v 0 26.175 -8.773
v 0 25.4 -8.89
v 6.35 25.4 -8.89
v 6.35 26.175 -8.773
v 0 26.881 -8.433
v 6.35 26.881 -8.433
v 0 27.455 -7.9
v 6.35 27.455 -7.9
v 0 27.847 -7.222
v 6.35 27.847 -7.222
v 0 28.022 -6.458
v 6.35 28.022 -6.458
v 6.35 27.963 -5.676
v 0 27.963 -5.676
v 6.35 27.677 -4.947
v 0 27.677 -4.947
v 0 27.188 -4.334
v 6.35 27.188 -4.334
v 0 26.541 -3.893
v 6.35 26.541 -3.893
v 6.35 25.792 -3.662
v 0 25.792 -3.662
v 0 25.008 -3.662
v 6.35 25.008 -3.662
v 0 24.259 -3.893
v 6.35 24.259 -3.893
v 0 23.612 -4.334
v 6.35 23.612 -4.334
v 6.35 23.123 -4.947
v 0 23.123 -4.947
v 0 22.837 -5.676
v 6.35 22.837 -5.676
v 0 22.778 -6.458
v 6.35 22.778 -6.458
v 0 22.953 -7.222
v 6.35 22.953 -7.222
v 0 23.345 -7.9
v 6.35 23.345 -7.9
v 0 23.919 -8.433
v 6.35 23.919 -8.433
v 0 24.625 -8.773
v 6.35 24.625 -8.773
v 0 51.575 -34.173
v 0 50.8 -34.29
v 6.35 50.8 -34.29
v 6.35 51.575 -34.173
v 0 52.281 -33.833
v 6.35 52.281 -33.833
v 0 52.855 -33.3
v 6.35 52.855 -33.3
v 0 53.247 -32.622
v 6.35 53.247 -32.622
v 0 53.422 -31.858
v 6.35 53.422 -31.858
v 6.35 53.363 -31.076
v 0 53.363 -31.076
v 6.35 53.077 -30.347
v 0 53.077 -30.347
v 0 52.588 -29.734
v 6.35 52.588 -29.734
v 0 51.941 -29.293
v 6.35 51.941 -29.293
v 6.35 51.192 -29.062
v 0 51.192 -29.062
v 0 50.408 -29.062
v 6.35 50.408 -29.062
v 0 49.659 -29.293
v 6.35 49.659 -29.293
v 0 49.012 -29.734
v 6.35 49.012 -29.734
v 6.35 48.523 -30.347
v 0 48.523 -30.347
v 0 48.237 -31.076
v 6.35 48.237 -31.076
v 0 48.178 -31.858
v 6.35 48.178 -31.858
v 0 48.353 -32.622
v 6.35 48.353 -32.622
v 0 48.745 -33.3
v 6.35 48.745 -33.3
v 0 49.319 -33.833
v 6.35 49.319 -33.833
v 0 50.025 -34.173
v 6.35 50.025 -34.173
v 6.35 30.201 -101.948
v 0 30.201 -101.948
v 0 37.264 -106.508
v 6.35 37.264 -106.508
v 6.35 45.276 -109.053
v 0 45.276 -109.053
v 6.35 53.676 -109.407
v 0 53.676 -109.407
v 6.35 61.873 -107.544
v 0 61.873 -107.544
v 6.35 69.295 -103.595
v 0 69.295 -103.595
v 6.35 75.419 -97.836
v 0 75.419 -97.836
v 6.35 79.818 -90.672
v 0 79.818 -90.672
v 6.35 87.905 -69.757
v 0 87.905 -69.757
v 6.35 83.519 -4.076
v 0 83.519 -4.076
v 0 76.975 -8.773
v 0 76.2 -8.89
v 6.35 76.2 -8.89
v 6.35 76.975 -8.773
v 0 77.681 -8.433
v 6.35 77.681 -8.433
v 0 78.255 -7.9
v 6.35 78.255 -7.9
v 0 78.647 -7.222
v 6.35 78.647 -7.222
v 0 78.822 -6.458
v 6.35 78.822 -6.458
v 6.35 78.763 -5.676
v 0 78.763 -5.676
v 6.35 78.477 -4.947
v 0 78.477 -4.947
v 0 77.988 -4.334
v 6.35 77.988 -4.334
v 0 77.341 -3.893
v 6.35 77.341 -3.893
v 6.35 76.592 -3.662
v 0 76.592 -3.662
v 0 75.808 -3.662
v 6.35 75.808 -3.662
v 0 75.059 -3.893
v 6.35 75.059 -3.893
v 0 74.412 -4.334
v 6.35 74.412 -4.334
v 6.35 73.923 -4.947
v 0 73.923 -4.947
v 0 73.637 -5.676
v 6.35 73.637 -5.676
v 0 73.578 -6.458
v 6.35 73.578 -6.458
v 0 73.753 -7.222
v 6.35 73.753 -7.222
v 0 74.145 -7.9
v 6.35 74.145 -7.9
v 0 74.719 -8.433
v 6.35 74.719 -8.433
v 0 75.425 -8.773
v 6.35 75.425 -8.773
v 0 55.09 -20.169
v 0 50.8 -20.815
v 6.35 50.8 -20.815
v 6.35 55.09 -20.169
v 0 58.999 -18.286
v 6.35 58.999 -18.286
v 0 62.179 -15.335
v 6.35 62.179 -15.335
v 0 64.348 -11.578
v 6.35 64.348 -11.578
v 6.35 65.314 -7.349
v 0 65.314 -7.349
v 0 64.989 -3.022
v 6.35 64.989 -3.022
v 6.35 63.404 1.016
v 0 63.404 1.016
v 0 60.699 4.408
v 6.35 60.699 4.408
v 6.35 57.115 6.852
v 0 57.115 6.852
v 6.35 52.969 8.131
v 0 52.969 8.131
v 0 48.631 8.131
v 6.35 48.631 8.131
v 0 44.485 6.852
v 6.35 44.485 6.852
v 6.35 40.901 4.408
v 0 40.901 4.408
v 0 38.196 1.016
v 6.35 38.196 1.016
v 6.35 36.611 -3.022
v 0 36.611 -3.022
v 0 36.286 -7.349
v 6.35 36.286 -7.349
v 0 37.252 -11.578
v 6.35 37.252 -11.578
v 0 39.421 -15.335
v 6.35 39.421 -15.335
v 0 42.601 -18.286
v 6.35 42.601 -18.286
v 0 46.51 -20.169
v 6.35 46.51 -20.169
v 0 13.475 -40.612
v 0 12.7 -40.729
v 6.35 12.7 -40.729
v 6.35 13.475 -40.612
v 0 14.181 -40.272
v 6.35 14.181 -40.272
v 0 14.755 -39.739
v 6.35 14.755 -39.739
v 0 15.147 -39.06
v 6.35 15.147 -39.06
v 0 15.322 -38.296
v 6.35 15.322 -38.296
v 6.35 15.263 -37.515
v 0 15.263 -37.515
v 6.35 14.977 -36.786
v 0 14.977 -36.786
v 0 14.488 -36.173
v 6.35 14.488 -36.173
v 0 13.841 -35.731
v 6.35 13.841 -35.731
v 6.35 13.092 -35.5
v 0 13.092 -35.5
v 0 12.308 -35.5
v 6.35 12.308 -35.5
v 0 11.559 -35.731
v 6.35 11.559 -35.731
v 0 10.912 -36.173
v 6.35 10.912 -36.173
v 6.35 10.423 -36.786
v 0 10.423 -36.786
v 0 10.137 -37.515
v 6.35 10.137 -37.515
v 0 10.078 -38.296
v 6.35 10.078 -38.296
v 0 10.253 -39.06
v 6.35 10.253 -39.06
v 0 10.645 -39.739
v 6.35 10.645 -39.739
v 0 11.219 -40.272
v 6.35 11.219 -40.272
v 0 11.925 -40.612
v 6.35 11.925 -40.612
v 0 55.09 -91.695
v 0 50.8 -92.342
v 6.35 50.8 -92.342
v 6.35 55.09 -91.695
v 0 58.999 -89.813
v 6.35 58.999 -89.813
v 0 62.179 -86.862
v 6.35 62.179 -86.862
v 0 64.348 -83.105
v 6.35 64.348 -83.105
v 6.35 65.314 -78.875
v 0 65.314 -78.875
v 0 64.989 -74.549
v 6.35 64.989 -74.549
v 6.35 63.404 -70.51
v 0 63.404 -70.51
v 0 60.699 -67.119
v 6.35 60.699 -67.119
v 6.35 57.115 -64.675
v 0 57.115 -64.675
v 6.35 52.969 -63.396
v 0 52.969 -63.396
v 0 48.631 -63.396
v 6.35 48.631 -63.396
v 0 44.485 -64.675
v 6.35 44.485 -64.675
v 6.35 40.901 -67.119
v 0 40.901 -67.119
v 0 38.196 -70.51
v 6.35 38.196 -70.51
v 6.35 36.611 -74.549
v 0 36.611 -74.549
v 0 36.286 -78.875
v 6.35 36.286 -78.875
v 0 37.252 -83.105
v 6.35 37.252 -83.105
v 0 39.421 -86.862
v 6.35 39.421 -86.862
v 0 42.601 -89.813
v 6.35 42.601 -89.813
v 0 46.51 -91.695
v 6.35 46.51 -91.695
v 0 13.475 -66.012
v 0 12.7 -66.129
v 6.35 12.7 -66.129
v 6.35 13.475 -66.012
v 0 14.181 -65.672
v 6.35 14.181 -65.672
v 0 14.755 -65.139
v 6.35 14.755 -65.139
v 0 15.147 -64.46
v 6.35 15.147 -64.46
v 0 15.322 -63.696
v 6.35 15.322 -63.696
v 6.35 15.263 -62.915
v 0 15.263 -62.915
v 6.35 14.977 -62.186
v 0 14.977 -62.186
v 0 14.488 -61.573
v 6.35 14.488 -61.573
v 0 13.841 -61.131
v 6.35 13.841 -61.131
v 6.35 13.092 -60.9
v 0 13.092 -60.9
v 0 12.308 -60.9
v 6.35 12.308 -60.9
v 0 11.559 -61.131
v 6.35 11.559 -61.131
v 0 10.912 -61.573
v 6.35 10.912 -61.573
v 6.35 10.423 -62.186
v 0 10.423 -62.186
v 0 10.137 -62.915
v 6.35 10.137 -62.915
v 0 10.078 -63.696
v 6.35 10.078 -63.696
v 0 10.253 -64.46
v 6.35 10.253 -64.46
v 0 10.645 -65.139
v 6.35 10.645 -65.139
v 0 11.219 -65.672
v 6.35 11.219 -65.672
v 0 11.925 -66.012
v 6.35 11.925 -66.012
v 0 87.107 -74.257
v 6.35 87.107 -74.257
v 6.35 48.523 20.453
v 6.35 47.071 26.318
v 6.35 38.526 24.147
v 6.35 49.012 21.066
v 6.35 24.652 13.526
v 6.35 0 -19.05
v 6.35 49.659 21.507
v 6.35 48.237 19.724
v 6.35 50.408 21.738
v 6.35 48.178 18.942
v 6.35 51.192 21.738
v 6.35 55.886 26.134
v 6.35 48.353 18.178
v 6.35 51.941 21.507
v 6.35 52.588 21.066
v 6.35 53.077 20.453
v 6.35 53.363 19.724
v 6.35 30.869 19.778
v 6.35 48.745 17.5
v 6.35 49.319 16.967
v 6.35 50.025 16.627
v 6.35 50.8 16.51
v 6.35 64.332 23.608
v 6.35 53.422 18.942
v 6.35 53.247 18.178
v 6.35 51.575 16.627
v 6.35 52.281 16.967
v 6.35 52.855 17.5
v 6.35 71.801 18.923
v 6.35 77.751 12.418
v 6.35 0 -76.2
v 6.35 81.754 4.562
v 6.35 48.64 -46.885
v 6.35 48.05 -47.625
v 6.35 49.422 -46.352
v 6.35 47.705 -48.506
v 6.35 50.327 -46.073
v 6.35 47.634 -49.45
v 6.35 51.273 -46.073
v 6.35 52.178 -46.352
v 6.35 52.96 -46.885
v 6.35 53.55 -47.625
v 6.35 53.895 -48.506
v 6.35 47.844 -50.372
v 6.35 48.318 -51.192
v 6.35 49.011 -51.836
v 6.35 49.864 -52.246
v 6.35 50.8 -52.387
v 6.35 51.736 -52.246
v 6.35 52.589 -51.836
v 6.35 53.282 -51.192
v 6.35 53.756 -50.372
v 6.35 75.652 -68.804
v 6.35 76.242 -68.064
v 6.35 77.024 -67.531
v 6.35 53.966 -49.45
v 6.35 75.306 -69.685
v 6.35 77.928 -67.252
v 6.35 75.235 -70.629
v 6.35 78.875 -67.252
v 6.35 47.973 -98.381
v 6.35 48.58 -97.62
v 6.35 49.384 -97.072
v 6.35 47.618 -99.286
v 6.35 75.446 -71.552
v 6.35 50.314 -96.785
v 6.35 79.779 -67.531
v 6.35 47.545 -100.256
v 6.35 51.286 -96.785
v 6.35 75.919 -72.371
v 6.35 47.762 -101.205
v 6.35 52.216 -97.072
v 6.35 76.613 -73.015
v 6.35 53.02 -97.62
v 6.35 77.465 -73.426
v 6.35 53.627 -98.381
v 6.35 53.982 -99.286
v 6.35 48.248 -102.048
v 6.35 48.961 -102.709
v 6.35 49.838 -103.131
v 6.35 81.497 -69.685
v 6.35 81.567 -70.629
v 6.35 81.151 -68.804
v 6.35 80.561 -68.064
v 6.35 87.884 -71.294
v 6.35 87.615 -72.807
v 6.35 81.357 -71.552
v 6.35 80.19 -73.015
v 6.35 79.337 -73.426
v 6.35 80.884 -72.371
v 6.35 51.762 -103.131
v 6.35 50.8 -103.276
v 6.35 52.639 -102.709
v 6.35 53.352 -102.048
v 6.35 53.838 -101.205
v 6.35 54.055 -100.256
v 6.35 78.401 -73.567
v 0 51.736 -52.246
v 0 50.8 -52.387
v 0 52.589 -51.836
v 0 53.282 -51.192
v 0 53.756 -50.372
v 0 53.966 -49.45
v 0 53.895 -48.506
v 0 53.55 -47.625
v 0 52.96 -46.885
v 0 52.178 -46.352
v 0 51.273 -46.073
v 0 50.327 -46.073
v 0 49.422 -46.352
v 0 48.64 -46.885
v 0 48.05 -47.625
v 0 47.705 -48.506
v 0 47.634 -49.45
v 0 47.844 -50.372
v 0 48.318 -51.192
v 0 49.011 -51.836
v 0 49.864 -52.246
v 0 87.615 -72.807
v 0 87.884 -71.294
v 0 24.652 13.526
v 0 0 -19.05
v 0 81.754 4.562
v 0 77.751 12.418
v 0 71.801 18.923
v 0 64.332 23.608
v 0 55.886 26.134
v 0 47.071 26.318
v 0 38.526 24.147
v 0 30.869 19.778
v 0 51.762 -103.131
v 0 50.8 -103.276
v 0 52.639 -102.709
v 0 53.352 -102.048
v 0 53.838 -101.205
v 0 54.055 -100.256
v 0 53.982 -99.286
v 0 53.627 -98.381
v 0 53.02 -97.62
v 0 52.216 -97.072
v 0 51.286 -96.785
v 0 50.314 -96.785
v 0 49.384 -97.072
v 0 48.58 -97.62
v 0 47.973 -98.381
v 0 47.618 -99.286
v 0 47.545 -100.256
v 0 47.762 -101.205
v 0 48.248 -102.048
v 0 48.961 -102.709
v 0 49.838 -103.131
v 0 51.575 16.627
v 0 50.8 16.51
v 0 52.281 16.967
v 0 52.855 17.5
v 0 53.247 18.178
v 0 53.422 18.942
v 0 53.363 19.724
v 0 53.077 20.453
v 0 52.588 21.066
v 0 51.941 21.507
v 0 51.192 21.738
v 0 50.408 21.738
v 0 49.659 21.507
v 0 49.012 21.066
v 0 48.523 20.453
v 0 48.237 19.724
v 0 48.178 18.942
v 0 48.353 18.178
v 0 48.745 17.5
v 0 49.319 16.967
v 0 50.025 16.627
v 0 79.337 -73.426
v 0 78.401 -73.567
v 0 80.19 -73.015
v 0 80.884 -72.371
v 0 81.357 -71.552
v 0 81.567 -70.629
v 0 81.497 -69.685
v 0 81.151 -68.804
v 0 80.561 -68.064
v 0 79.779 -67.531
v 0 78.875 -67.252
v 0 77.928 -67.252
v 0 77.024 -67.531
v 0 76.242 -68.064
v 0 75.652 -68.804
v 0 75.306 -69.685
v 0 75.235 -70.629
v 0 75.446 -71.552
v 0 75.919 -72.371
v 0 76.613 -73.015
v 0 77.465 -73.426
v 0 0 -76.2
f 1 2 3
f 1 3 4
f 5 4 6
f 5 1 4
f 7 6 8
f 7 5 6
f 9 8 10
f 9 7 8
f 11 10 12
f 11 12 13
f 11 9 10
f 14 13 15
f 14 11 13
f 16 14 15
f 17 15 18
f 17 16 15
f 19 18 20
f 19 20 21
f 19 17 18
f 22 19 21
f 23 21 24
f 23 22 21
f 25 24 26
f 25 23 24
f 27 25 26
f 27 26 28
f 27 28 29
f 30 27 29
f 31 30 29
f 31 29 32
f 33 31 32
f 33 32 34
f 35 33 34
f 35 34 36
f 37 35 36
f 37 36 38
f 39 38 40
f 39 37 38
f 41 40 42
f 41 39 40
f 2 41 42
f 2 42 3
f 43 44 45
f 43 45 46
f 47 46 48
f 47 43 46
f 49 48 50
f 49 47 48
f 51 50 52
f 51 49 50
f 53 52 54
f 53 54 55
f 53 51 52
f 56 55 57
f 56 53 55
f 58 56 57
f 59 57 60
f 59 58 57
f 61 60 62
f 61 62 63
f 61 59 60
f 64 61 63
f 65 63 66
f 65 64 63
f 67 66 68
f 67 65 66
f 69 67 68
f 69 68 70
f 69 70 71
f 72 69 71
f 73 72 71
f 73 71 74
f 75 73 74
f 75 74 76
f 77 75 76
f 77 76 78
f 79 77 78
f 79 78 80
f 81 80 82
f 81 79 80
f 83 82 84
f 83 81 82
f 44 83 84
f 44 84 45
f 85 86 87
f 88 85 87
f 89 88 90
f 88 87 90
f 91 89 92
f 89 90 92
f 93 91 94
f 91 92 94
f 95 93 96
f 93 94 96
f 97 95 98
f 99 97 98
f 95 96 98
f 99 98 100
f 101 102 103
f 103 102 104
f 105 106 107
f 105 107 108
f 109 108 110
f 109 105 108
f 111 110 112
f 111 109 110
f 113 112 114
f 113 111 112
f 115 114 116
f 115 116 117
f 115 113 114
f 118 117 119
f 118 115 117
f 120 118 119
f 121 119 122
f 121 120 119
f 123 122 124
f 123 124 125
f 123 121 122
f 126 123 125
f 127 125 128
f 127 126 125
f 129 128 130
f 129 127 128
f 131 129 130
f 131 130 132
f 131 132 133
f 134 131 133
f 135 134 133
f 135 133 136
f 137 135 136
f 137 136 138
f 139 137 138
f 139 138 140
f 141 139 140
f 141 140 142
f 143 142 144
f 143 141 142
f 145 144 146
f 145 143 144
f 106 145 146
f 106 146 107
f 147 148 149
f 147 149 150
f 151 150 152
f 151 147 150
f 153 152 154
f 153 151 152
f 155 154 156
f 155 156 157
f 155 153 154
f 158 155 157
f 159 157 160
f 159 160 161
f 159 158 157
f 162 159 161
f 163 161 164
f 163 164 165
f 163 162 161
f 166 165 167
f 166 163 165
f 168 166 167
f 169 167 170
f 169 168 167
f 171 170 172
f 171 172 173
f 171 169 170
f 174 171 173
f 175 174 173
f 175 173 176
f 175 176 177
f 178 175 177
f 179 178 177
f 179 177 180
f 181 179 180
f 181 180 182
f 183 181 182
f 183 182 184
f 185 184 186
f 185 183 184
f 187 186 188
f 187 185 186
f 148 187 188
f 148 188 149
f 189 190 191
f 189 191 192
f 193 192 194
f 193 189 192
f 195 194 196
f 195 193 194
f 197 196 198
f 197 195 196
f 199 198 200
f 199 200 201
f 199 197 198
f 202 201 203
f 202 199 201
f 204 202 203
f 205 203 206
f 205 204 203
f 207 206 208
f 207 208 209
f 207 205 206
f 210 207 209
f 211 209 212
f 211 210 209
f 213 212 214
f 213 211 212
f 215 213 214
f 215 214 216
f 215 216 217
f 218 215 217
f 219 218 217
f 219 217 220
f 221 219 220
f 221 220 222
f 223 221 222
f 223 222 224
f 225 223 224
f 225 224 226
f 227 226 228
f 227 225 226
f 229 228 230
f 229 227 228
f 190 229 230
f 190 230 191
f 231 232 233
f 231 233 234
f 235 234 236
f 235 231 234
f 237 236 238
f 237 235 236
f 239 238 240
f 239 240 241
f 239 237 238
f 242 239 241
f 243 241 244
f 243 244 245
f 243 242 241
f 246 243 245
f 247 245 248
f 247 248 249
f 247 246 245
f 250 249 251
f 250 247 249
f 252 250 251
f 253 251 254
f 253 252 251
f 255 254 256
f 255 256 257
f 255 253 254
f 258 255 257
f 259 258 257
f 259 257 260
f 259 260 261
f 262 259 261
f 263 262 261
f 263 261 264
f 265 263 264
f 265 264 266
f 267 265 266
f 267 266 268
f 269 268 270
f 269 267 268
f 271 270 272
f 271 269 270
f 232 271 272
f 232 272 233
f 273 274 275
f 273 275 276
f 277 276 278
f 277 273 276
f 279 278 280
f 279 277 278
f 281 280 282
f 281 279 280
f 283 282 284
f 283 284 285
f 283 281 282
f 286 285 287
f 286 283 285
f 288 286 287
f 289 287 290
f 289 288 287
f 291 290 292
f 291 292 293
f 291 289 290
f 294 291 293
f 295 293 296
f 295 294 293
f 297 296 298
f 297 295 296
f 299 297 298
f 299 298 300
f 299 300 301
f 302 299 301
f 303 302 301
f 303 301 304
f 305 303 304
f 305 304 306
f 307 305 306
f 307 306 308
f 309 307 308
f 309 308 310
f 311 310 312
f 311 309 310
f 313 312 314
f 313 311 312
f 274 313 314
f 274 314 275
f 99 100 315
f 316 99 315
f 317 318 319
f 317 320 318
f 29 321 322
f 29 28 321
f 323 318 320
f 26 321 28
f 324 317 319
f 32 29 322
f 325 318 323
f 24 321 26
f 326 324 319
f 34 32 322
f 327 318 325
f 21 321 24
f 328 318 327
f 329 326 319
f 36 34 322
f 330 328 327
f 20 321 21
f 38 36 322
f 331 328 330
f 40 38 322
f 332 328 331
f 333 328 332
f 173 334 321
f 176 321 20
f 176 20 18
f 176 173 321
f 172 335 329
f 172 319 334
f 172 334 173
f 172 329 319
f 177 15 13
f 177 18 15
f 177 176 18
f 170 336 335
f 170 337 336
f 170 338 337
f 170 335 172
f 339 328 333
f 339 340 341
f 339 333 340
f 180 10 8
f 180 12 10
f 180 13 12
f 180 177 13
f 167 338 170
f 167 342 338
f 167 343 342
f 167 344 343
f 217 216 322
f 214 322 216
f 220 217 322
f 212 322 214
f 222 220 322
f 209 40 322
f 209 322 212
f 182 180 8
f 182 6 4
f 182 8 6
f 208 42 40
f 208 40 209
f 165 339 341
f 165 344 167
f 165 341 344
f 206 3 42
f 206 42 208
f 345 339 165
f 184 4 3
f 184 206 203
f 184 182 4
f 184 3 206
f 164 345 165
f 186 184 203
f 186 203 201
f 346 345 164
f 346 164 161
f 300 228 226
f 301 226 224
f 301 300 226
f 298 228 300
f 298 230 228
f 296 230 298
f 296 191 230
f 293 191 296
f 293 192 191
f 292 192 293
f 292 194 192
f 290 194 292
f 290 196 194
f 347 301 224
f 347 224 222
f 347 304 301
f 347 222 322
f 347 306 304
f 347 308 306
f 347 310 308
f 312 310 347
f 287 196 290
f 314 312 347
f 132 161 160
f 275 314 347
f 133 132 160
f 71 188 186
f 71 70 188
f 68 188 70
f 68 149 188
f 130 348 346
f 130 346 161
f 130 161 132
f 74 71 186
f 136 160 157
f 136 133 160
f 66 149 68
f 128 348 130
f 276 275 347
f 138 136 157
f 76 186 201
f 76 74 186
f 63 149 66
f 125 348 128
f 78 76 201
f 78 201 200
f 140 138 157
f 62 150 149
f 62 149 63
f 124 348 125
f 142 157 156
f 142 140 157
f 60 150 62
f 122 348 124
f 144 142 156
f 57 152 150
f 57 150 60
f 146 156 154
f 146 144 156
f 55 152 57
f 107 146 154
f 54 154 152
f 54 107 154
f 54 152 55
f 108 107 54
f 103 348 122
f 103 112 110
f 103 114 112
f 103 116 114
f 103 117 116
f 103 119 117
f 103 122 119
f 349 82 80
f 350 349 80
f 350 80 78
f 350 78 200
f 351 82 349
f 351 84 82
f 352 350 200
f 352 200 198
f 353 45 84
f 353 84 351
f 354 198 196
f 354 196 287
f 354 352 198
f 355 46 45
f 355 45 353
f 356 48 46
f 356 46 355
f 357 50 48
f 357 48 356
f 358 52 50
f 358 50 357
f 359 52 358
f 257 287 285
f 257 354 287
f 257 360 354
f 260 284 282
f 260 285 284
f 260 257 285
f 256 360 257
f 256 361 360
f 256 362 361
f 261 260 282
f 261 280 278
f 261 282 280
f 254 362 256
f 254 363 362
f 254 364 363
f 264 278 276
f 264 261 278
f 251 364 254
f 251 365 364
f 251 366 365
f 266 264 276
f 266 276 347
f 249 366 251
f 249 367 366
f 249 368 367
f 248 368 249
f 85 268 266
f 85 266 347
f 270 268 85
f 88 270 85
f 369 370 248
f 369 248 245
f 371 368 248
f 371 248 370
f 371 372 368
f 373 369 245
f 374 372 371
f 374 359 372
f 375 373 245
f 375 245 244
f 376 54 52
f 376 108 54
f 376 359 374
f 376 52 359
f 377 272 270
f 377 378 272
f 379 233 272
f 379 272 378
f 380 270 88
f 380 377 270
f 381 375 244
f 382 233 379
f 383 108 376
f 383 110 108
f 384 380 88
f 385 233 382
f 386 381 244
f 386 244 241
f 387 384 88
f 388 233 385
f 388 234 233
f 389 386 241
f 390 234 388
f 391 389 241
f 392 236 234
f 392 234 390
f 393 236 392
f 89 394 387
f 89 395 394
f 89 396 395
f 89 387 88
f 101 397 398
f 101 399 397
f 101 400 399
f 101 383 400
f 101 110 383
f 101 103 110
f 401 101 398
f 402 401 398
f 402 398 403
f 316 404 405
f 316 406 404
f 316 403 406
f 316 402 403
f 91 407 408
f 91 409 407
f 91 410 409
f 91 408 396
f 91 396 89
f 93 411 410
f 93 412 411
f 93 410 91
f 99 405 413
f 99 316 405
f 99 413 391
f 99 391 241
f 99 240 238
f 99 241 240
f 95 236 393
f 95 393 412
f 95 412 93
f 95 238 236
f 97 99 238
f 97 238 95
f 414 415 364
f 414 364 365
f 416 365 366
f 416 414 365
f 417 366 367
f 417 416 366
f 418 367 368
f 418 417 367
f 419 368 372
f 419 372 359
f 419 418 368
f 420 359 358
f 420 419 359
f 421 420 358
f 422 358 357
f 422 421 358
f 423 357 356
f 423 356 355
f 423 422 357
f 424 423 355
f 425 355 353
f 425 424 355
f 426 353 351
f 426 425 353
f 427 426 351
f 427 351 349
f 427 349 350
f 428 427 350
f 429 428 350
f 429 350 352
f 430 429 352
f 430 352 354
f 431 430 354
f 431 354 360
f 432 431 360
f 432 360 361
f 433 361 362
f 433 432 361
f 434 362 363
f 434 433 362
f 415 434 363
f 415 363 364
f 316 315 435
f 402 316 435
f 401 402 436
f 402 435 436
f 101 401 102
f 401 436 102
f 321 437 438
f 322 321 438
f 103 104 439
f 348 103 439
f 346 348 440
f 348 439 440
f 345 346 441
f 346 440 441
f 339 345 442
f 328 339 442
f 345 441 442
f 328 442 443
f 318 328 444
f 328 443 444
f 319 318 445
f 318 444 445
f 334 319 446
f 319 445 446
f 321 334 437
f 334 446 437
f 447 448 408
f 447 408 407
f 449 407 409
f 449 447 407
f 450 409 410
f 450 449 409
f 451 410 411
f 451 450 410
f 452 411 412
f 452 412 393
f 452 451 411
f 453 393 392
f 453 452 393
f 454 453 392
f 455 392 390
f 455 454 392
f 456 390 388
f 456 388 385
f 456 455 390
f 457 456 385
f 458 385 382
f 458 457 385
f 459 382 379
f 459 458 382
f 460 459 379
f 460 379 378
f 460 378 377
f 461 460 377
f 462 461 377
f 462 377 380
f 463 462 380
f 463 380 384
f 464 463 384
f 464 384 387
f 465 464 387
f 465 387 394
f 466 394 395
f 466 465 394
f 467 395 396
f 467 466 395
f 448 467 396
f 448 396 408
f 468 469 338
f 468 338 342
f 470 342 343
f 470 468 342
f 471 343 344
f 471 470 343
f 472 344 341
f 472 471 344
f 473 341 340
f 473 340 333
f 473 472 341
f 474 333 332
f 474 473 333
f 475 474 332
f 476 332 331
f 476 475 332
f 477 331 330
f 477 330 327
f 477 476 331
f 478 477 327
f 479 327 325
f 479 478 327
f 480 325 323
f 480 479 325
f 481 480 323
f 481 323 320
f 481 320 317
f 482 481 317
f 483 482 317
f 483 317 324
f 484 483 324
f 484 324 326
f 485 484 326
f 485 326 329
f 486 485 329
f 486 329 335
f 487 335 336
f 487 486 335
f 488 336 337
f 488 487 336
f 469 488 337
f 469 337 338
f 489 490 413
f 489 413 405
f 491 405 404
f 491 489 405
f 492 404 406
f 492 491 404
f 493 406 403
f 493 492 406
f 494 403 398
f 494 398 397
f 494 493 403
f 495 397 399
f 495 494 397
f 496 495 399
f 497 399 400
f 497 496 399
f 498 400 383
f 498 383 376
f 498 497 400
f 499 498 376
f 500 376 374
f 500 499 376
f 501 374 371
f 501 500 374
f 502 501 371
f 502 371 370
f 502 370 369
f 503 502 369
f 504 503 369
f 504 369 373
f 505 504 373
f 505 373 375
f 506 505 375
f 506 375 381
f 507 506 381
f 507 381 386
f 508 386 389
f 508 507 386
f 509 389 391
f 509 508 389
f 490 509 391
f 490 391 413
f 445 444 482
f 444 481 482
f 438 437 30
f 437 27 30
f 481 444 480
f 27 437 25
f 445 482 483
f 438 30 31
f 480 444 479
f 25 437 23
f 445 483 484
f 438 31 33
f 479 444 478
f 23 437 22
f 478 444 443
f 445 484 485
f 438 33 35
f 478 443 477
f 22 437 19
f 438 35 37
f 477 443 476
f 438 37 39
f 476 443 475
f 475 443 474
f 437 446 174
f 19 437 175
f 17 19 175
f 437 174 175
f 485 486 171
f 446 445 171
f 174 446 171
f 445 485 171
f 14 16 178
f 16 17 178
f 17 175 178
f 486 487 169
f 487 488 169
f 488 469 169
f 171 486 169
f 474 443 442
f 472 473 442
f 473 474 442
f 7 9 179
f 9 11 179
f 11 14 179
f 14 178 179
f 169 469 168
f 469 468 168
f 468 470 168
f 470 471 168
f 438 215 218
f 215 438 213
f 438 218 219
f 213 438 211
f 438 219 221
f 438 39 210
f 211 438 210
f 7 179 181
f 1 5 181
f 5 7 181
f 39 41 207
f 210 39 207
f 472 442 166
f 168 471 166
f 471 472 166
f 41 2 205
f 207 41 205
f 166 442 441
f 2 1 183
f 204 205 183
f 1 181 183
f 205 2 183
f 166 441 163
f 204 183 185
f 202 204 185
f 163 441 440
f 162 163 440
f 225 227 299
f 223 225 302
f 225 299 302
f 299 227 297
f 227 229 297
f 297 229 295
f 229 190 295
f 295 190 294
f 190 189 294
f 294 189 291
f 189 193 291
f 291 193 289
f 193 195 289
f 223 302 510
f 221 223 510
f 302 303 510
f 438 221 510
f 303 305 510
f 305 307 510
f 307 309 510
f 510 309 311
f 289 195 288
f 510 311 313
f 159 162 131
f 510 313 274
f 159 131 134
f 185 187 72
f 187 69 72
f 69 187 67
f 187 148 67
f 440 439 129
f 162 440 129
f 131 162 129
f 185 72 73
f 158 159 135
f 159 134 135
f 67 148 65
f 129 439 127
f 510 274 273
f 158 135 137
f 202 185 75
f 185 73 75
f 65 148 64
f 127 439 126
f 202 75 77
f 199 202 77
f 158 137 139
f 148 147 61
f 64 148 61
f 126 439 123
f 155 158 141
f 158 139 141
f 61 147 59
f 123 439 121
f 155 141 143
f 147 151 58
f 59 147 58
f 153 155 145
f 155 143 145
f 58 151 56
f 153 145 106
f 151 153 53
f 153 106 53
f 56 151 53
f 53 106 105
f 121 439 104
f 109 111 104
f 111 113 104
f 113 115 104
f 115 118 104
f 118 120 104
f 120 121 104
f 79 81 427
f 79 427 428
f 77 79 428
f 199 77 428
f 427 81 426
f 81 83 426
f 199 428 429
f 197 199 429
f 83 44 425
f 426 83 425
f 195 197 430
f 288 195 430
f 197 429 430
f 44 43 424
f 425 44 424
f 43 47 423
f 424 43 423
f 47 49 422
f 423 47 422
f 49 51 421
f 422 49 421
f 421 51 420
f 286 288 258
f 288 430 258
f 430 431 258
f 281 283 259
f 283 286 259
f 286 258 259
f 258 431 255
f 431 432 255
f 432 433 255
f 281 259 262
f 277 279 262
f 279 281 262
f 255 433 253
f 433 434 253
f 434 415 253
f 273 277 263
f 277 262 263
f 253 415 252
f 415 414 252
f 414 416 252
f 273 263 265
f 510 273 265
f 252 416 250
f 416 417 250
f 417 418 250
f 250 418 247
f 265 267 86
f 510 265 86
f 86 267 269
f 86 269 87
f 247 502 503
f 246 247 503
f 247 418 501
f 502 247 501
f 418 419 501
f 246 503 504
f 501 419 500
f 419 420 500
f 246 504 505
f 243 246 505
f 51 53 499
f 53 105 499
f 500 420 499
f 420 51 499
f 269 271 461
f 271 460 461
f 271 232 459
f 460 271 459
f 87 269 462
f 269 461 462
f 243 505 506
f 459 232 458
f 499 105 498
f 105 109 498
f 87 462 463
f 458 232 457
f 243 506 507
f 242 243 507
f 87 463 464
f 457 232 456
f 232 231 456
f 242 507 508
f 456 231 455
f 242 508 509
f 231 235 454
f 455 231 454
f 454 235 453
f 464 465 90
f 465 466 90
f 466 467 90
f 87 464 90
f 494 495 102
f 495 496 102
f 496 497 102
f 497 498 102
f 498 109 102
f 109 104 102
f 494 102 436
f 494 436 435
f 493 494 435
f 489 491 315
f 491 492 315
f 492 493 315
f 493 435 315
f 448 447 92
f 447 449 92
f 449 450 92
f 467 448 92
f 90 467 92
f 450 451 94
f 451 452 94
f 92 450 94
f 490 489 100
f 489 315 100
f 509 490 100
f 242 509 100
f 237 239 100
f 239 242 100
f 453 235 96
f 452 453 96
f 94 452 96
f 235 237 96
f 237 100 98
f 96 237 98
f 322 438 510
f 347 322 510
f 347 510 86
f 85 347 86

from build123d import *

# Parameters (mm, degrees)
SKETCH1_R           = 2.6289
SKETCH1_R_2         = 14.5542
SKETCH1_R_3         = 3.175
SKETCH1_R_4         = 3.2639
CORE_GEOMETRY_DEPTH = 6.35


with BuildPart() as part:
    # Sketch1 → Core geometry (new body)
    with BuildSketch(Plane(origin=(0, 0, 0), x_dir=(0, 0, -1), z_dir=(1, 0, 0))):
        with BuildLine():
            Line((76.2, 0), (101.94847561, 30.201219512))
            ThreePointArc((101.94847561, 30.201219512), (108.748010679, 57.836283003), (90.672243723, 79.818026797))
            Line((90.672243723, 79.818026797), (74.257168903, 87.106738525))
            ThreePointArc((74.257168903, 87.106738525), (72.055689407, 87.779865373), (69.757012949, 87.905158095))
            Line((69.757012949, 87.905158095), (4.07592642, 83.518510516))
            ThreePointArc((4.07592642, 83.518510516), (-25.155846577, 60.194220655), (-13.526294854, 24.651674645))
            Line((-13.526294854, 24.651674645), (19.05, 0))
            Line((19.05, 0), (76.2, 0))
        make_face()
        with Locations((38.1, 12.7)):
            Circle(SKETCH1_R, mode=Mode.SUBTRACT)
        with Locations((63.5, 12.7)):
            Circle(SKETCH1_R, mode=Mode.SUBTRACT)
        with Locations((77.7875, 50.8)):
            Circle(SKETCH1_R_2, mode=Mode.SUBTRACT)
        with Locations((6.2611, 50.8)):
            Circle(SKETCH1_R_2, mode=Mode.SUBTRACT)
        with Locations((6.2611, 76.2)):
            Circle(SKETCH1_R, mode=Mode.SUBTRACT)
        with Locations((6.2611, 25.4)):
            Circle(SKETCH1_R, mode=Mode.SUBTRACT)
        with Locations((31.6611, 50.8)):
            Circle(SKETCH1_R, mode=Mode.SUBTRACT)
        with Locations((-19.1389, 50.8)):
            Circle(SKETCH1_R, mode=Mode.SUBTRACT)
        with Locations((49.2125, 50.8)):
            Circle(SKETCH1_R_3, mode=Mode.SUBTRACT)
        with Locations((70.391745786, 78.401330486)):
            Circle(SKETCH1_R_3, mode=Mode.SUBTRACT)
        with Locations((100.0125, 50.8)):
            Circle(SKETCH1_R_4, mode=Mode.SUBTRACT)
    extrude(amount=CORE_GEOMETRY_DEPTH)


solid = part.part
